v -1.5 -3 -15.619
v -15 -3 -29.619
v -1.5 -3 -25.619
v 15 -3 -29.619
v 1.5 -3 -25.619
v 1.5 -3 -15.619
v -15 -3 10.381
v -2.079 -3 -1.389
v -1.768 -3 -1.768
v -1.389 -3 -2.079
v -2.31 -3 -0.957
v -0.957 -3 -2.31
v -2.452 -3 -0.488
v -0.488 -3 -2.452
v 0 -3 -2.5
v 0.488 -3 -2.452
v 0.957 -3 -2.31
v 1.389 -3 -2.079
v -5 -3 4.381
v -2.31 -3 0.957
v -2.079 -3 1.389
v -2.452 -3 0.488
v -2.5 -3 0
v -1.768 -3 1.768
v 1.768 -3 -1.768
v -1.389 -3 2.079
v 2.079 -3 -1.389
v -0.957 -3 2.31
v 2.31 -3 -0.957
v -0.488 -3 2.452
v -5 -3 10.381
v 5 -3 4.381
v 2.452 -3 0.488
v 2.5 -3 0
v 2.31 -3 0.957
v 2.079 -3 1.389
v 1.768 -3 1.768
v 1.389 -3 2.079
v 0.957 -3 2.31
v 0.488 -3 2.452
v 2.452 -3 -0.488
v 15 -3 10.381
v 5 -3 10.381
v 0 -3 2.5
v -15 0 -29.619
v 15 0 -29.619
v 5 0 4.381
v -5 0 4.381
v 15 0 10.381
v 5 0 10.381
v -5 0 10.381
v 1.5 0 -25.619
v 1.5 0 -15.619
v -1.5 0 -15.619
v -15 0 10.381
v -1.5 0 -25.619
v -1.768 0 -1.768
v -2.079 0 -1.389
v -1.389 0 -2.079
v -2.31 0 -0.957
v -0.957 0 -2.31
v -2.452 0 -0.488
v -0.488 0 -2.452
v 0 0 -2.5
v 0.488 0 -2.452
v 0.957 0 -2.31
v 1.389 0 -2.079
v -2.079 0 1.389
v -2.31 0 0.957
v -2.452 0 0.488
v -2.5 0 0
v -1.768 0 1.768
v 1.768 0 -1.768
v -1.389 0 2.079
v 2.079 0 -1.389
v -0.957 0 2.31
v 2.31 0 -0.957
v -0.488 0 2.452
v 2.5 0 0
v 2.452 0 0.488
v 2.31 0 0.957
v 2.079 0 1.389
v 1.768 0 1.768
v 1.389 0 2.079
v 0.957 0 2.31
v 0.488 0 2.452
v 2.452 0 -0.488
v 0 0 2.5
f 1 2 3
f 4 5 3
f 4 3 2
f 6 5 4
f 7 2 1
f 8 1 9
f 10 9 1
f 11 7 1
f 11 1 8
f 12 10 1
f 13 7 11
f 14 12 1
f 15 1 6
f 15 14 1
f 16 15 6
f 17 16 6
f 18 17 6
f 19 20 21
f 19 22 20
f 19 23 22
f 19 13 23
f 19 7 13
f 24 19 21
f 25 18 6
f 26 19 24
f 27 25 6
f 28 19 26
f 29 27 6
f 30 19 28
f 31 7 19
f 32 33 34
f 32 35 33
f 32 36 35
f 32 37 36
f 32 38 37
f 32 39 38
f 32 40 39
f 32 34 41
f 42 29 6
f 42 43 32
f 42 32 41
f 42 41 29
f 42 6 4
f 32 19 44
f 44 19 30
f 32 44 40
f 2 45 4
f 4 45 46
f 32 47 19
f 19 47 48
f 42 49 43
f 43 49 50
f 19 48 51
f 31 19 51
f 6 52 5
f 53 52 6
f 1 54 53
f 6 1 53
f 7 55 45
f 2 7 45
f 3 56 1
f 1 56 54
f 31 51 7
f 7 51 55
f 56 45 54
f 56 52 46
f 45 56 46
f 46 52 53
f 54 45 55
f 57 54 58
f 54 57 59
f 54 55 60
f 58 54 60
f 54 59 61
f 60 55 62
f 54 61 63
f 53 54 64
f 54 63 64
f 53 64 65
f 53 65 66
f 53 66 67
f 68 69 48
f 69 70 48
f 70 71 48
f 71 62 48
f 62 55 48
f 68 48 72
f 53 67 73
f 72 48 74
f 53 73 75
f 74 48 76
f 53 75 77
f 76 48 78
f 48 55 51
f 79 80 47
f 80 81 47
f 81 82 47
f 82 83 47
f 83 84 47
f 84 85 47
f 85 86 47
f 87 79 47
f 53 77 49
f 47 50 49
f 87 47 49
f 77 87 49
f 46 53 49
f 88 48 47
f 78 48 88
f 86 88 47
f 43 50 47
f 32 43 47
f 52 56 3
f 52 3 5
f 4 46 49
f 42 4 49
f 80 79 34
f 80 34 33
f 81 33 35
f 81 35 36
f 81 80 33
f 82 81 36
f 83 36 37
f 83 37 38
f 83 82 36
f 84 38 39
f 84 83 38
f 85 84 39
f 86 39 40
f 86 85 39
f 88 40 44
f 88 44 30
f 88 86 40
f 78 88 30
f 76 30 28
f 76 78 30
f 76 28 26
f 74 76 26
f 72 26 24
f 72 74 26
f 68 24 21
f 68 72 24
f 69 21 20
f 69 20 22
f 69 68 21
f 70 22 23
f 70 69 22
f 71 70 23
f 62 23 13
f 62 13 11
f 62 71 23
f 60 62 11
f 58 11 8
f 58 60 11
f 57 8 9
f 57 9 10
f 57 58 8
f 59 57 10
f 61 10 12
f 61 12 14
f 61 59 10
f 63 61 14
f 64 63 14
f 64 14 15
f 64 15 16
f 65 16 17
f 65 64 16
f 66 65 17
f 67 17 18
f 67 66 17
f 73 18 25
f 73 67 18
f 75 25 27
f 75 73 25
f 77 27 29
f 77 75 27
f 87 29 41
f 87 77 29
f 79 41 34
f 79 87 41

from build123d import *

# Parameters (mm, degrees)
F0_W     = 3
F0_H     = 10
F0_R     = 2.5
F1_DEPTH = 3


with BuildPart() as f1:
    # F0 (on Front) → F1 (new body)
    with BuildSketch(Plane.XZ):
        Polygon((5, 4.380814), (-5, 4.380814), (-5, 10.380814), (-15, 10.380814), (-15, -29.619186), (15, -29.619186), (15, 10.380814), (5, 10.380814), align=None)
        with Locations((0, -20.619186)):
            Rectangle(F0_W, F0_H, mode=Mode.SUBTRACT)
        Circle(F0_R, mode=Mode.SUBTRACT)
    extrude(amount=F1_DEPTH)


solid = f1.part
